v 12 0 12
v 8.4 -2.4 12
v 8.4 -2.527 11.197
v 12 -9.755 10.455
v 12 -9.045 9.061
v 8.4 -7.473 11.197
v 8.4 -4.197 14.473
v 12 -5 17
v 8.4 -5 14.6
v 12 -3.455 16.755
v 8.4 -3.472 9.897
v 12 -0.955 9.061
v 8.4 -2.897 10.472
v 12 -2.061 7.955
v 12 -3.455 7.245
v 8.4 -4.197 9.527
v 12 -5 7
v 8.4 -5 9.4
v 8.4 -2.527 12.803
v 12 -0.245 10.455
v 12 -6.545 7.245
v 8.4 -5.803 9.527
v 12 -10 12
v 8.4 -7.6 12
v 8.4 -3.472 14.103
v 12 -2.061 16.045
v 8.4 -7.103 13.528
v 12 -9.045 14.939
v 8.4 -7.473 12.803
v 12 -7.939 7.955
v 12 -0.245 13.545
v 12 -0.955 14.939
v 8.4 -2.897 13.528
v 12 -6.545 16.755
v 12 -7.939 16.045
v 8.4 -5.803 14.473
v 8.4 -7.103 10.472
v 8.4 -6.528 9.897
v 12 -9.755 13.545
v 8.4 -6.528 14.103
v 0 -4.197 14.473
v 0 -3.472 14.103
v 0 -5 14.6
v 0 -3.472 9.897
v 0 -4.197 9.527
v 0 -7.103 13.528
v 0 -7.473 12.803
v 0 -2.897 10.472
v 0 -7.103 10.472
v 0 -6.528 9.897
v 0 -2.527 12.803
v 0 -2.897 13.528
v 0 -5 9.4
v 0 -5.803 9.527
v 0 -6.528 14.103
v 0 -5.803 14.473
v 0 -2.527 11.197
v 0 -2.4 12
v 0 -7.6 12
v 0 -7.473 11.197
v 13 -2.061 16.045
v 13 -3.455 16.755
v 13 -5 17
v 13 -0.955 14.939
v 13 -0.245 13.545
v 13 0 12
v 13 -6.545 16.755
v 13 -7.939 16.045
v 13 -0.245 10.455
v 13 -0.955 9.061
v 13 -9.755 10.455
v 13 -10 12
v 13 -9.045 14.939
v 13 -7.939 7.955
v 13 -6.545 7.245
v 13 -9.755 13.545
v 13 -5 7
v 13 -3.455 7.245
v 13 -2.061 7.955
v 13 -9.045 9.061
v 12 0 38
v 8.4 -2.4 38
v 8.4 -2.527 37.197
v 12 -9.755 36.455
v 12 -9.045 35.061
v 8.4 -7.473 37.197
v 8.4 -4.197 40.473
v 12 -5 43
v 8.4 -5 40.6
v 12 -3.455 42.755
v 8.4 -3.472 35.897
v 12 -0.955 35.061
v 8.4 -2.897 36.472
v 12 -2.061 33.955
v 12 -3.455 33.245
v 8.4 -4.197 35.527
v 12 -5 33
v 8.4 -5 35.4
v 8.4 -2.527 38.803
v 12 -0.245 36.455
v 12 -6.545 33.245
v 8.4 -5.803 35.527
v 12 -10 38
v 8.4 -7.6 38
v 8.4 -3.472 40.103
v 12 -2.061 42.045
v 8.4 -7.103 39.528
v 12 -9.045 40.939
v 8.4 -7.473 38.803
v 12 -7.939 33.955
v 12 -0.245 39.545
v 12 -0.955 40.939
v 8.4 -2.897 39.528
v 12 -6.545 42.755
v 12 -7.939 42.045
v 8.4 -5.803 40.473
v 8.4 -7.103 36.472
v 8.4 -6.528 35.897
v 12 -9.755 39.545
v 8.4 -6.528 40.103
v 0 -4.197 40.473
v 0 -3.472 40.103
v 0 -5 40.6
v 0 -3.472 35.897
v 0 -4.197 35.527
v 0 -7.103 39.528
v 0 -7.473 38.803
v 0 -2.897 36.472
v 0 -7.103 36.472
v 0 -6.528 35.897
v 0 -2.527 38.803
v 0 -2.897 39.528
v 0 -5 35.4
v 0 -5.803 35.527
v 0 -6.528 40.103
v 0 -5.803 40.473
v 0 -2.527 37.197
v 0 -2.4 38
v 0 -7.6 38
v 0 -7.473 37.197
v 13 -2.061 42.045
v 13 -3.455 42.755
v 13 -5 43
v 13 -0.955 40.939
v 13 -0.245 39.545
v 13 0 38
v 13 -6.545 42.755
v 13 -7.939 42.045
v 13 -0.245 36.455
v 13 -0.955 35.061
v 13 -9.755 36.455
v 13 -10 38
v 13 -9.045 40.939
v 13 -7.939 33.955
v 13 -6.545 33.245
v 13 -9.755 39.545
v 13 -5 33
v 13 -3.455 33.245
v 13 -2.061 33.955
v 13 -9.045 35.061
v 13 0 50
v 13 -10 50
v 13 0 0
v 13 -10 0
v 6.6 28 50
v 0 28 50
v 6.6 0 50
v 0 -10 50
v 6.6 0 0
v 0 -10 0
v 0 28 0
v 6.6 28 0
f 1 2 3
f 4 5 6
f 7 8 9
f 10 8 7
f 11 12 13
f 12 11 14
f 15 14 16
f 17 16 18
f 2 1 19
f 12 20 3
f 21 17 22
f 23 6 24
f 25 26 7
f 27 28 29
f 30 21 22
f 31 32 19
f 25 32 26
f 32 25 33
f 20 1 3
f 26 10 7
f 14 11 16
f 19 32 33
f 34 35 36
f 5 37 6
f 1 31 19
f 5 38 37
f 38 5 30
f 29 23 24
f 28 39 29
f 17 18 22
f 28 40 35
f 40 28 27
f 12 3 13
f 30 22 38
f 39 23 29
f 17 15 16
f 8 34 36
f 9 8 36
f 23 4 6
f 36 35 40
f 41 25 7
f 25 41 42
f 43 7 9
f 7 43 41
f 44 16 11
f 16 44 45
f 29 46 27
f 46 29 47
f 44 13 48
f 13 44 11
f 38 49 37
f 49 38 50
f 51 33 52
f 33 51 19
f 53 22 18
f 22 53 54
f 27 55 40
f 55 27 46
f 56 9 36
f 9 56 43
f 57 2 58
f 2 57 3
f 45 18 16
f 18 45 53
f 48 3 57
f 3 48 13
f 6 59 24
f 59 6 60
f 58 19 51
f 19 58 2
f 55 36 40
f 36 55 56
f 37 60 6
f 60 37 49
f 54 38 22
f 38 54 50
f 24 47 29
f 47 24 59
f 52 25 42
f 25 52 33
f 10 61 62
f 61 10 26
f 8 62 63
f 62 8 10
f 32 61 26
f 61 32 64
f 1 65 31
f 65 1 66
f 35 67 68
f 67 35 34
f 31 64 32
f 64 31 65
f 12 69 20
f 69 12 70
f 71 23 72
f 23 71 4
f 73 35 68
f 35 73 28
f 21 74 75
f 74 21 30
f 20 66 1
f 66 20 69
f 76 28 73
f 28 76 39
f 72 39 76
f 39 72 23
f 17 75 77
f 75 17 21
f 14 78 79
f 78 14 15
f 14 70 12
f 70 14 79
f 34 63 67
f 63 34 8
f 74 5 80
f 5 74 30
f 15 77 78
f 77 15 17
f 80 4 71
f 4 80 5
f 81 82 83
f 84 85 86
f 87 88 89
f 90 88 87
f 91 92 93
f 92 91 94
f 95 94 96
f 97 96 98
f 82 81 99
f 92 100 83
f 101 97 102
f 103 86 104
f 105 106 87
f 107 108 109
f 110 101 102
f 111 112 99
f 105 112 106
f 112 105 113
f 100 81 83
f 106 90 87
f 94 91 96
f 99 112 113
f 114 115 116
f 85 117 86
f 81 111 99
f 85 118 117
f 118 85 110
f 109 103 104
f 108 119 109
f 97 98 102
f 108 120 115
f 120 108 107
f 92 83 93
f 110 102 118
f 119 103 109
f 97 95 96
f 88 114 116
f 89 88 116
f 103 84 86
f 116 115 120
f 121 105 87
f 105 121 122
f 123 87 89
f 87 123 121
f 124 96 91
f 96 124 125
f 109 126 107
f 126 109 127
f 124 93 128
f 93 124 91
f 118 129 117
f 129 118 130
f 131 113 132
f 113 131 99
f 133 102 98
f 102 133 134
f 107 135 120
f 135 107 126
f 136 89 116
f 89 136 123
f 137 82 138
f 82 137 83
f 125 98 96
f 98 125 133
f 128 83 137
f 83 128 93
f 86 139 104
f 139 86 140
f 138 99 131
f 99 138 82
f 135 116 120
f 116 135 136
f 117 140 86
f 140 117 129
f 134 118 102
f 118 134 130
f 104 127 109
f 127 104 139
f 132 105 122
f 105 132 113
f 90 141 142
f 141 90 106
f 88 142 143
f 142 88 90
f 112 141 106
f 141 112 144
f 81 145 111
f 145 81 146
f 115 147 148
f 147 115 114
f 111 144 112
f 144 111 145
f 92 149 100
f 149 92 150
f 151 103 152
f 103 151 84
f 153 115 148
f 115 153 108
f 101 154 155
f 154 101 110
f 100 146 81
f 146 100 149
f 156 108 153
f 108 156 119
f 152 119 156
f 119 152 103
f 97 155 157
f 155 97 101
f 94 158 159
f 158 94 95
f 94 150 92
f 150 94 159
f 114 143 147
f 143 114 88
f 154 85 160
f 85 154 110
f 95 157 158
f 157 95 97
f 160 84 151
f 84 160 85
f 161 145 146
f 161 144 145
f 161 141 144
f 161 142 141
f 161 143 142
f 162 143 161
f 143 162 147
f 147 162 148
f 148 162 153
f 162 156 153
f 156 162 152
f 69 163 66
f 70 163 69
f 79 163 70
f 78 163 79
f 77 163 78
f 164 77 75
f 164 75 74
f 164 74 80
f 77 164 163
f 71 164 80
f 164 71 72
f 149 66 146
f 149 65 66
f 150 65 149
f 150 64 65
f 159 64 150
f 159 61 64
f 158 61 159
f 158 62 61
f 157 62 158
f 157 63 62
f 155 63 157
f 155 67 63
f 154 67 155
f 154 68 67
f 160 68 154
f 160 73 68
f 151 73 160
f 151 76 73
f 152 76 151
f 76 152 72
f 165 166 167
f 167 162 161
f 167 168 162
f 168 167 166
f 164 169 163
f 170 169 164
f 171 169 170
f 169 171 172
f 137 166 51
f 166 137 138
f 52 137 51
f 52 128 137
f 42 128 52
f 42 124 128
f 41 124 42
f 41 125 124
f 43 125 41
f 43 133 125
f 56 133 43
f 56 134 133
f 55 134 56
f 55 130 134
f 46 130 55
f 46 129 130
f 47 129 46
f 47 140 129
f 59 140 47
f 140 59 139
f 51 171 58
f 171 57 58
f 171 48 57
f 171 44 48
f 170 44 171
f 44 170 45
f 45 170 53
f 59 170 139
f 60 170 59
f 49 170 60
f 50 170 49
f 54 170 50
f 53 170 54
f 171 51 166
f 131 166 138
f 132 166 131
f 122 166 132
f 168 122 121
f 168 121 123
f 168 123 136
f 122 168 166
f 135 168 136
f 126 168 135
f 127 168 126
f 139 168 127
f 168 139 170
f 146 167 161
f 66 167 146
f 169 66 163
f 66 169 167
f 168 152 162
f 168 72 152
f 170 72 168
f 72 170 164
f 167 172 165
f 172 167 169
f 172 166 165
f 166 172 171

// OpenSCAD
x = 6.6;

x1 = 13;

y1 = 10;
y = 28;


z = 50;

n_screws = 2;
screw_offset = 12;

module screw_countersunk(
        l=20,   //length
        dh = 10,   //head dia
        lh = 3.6,   //head length
        ds = 5.2,  //shaft dia
        rec = 2,
        $fn=20,
        )
{
        translate([0, 0, rec]) {
          cylinder(h=lh, r1=dh/2, r2=ds/2);
          cylinder(h=l, d=ds);
        }
        cylinder(h=rec, d=dh);
}


cube([x, y, z]);
translate([0, -y1, 0]) difference() {
cube([x1, y1, z]);

z_off = z - 2 * screw_offset;
for(a = [0:n_screws-1])   
  translate([x1+1, 0.5*y1, screw_offset + a * z_off / (n_screws - 1)]) rotate([0, -90, 0]) screw_countersunk();
    
}
